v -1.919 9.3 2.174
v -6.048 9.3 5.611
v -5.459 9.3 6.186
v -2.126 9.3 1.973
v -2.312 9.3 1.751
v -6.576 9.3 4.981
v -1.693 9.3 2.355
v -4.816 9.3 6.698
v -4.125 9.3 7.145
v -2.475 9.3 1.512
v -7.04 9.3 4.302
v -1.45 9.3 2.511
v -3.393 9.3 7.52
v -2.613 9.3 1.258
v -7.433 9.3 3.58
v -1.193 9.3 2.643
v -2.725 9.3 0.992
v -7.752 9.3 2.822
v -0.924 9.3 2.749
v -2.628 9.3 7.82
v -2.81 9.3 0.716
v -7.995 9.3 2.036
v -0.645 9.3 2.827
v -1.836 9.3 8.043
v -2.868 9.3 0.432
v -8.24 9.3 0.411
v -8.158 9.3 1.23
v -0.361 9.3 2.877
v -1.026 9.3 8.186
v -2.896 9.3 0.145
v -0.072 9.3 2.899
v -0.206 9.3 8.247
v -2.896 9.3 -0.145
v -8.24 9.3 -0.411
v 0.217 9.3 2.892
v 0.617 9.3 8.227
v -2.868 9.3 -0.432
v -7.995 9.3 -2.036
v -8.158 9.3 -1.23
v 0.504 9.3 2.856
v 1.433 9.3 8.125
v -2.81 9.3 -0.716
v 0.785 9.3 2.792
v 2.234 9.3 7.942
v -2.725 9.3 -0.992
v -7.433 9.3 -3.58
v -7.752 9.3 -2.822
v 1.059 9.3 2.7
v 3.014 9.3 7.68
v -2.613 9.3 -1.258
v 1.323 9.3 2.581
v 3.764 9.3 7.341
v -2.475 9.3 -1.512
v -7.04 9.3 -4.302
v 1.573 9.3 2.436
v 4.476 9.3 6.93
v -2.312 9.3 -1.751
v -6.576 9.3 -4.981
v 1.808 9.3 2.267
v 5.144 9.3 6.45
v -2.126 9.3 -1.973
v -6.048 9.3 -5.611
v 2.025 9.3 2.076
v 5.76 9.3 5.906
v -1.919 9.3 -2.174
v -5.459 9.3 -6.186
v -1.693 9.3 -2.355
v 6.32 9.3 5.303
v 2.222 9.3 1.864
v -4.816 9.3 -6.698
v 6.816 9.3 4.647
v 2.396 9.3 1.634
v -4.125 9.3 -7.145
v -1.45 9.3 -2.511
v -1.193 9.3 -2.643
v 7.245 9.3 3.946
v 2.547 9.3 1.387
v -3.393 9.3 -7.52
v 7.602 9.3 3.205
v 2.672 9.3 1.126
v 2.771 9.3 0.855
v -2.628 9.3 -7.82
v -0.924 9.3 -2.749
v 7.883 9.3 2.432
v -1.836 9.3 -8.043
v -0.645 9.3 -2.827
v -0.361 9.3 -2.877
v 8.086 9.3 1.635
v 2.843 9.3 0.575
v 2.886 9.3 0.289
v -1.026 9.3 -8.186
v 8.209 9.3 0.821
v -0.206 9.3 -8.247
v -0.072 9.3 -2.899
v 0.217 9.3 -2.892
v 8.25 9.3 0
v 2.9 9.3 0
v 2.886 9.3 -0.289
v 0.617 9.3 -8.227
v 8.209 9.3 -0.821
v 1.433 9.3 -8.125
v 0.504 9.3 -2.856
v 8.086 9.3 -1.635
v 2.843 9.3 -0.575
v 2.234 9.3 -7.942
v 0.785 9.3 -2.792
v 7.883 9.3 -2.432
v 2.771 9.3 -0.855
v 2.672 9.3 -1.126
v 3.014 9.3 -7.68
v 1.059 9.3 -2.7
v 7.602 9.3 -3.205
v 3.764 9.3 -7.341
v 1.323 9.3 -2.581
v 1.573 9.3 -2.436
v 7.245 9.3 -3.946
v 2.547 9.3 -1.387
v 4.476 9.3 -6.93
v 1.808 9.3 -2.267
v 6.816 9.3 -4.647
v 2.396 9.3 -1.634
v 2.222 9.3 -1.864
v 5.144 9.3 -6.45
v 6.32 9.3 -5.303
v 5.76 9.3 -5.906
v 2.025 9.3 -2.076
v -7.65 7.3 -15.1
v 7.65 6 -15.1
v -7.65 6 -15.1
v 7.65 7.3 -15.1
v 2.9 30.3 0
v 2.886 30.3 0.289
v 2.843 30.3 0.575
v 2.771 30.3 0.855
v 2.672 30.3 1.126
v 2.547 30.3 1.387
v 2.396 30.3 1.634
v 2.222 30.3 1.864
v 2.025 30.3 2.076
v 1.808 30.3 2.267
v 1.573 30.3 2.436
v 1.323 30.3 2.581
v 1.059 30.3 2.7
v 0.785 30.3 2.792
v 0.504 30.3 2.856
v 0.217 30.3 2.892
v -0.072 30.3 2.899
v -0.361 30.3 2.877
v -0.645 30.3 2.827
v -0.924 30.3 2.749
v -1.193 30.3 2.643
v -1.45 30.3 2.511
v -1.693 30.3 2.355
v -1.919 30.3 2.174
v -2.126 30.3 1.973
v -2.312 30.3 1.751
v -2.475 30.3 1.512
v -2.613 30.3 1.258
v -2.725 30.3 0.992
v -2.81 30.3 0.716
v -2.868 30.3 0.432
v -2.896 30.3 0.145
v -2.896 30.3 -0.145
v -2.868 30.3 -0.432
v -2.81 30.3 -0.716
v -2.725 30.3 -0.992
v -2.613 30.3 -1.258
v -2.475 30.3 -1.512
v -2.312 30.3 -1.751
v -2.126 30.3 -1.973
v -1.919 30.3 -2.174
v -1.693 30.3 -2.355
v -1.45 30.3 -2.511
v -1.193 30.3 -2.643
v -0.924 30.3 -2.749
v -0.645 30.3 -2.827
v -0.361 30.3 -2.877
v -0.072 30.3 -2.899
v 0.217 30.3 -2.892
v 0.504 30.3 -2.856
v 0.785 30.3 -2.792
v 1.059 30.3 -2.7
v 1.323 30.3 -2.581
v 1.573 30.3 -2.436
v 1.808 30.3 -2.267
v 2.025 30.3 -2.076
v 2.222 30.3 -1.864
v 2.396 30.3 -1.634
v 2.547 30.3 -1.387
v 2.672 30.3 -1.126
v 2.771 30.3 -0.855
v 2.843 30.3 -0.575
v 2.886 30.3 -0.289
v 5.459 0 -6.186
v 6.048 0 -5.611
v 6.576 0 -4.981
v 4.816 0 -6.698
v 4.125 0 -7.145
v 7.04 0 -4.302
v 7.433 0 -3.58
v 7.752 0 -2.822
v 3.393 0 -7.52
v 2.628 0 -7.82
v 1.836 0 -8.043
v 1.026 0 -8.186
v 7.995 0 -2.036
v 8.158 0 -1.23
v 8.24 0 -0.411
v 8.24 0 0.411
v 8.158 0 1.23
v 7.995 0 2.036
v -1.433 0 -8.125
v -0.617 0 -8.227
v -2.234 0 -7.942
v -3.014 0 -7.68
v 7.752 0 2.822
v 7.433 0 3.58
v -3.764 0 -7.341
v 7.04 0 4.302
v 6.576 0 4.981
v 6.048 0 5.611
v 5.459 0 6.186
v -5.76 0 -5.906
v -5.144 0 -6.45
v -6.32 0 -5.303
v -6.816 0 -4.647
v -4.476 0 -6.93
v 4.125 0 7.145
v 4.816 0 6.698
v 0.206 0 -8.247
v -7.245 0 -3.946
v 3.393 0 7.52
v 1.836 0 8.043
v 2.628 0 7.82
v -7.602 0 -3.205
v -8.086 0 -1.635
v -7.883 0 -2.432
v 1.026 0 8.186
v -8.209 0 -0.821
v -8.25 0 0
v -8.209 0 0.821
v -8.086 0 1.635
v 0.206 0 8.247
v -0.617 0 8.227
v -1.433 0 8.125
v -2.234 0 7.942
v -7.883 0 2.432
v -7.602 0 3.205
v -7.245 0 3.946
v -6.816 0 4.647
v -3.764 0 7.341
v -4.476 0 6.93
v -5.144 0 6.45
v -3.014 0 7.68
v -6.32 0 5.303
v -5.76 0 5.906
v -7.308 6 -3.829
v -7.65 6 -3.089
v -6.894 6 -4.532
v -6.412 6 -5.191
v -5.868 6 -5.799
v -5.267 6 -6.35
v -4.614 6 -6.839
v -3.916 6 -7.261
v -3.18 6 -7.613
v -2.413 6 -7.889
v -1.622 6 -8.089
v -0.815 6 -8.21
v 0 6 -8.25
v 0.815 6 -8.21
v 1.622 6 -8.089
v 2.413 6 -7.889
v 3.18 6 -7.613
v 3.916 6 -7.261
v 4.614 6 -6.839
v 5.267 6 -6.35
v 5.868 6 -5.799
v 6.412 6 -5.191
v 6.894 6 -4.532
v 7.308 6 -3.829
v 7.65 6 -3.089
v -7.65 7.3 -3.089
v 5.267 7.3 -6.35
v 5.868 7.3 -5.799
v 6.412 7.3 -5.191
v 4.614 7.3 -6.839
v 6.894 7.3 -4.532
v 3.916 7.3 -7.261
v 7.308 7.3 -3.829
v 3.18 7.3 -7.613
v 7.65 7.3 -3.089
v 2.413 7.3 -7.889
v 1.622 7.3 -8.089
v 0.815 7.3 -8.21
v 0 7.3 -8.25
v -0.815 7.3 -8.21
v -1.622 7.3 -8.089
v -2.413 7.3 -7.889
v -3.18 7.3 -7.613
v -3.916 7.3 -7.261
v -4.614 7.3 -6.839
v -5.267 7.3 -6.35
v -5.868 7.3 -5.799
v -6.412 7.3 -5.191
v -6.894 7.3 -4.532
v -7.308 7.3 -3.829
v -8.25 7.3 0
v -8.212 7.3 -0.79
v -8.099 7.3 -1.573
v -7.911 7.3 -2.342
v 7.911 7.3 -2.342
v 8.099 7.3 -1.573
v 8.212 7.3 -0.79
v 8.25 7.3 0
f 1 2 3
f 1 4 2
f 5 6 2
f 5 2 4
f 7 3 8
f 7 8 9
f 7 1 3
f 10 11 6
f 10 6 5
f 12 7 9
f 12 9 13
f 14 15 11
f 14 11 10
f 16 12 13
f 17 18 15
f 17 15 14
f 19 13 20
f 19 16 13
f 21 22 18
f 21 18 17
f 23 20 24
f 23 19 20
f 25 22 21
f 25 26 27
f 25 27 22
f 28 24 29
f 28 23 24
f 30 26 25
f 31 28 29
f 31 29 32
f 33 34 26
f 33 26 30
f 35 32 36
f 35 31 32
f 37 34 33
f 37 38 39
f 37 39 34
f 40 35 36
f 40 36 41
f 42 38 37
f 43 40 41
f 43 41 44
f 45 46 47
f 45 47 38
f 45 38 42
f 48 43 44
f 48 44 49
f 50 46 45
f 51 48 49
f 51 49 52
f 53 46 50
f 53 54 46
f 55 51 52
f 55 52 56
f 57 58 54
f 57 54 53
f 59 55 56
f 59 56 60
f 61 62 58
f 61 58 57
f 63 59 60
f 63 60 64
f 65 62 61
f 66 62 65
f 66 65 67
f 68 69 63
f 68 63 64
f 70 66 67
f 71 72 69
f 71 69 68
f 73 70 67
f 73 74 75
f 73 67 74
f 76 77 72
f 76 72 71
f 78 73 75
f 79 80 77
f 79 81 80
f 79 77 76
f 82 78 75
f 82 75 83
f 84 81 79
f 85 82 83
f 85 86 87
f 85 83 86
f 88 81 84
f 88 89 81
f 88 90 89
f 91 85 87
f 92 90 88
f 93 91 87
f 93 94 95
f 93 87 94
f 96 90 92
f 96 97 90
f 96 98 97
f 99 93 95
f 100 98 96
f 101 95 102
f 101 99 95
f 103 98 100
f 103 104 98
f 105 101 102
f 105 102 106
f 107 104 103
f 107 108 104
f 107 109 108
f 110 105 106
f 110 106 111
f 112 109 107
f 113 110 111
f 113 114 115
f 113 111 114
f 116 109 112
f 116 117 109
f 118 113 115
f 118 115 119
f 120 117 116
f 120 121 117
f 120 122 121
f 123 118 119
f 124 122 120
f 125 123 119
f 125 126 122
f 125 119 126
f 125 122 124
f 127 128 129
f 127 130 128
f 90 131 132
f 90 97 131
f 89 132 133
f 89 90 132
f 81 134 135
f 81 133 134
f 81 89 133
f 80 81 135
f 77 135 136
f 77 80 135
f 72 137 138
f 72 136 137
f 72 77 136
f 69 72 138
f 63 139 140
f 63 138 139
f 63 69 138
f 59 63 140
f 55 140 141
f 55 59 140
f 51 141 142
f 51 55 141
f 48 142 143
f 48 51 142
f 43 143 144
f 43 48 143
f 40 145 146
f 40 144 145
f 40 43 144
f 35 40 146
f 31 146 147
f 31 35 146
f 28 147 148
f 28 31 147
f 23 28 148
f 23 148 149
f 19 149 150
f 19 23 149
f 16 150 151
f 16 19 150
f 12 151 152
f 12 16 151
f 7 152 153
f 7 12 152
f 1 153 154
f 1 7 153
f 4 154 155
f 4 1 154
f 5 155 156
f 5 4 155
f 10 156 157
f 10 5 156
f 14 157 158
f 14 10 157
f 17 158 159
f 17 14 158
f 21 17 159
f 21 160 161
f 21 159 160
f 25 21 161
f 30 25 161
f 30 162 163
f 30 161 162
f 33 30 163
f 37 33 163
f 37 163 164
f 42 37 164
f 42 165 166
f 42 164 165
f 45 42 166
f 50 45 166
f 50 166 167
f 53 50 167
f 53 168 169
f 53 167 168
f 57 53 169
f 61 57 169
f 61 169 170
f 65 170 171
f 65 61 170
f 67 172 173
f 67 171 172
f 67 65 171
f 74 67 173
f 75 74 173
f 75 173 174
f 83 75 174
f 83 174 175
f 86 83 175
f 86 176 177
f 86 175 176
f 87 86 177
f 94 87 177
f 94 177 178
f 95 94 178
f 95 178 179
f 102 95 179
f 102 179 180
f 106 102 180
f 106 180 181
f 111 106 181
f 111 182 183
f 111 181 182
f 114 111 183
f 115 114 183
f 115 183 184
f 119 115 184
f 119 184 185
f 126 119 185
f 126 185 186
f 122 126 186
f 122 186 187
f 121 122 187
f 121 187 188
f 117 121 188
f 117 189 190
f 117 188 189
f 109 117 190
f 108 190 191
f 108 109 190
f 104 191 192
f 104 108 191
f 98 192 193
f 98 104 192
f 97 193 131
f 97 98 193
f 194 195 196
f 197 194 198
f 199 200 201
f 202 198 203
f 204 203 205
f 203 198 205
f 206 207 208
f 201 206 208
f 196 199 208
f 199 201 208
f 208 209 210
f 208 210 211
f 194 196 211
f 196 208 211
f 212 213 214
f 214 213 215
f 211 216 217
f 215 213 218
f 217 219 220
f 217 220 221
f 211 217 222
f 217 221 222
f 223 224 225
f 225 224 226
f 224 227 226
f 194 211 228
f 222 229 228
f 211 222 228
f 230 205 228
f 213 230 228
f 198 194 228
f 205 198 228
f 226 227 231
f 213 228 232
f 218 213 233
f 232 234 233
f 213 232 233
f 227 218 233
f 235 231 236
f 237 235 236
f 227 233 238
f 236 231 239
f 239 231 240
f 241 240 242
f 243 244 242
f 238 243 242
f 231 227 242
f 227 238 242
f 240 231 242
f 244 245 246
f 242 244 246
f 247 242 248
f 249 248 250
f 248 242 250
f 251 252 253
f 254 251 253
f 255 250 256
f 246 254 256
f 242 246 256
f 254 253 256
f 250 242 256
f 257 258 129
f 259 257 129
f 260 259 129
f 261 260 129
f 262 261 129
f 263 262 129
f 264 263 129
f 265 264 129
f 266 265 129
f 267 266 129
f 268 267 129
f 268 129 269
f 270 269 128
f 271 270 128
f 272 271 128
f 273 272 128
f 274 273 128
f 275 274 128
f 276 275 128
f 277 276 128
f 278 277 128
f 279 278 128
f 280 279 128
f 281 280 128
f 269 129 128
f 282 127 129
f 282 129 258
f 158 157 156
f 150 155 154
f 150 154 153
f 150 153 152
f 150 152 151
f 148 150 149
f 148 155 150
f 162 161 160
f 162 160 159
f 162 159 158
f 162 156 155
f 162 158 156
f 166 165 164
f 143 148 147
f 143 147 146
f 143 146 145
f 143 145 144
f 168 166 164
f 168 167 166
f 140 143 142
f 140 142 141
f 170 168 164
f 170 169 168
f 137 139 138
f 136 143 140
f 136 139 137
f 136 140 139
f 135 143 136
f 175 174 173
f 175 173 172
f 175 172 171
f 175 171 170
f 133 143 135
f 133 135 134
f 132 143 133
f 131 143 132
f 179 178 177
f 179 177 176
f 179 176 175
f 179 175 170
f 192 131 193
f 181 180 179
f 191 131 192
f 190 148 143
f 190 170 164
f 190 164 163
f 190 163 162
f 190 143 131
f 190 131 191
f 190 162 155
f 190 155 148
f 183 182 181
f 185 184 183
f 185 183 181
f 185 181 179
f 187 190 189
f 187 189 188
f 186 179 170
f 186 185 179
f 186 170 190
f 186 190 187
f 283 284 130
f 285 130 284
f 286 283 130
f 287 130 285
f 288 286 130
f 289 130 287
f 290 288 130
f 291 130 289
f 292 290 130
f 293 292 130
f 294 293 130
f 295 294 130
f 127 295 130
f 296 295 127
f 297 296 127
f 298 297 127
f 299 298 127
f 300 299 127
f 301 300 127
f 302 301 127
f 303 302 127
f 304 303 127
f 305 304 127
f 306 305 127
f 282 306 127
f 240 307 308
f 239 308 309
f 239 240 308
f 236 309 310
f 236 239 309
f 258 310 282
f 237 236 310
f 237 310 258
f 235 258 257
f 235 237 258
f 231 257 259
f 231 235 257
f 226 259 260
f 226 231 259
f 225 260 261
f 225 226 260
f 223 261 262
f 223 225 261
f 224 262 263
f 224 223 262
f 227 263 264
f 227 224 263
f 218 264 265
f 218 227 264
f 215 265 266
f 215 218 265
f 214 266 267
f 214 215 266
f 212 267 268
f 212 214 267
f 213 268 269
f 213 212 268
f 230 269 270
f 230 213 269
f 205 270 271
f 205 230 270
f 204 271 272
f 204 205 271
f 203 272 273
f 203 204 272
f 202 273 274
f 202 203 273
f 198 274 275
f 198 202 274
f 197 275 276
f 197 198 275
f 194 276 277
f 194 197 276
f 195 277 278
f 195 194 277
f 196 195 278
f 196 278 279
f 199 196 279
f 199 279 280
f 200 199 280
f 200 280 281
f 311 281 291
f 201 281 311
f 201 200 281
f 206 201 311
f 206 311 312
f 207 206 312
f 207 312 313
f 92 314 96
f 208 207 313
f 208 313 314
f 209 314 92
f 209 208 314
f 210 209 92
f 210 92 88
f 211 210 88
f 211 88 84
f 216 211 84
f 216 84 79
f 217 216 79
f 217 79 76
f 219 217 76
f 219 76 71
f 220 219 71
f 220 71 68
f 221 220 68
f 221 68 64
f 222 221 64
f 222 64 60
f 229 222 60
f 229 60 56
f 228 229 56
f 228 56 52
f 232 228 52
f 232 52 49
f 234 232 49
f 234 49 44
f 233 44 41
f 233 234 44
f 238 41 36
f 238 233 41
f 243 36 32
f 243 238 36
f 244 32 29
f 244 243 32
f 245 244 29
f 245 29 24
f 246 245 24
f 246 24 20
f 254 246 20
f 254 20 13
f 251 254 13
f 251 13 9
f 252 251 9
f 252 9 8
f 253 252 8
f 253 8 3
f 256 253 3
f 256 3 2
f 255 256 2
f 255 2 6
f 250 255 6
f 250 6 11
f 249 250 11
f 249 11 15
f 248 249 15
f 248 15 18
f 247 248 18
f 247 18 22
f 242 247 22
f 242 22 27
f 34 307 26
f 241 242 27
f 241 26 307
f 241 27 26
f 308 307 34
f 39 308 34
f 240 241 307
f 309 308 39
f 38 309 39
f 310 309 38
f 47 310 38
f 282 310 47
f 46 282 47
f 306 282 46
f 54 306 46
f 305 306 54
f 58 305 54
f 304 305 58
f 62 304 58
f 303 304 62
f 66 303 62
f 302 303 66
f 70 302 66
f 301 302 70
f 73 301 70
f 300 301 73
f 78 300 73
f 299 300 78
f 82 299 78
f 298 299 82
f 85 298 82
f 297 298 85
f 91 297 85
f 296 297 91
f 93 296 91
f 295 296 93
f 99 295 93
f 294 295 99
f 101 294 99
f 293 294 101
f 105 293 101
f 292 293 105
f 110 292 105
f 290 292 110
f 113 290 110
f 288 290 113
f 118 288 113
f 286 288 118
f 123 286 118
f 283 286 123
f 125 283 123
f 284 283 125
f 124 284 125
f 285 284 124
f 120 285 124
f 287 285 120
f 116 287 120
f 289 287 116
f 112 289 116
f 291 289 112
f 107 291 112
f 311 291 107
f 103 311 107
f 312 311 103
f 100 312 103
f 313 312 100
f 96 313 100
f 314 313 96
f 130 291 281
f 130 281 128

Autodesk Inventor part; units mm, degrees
ref_plane "YZ Plane" through (0, 0, 0) normal (1, 0, 0) x (0, 1, 0)
ref_plane "XZ Plane" through (0, 0, 0) normal (0, 1, 0) x (-1, 0, 0)
ref_plane "XY Plane" through (0, 0, 0) normal (0, 0, 1) x (1, 0, 0)
sketch "Sketch1" plane through (0, 0, 0) normal (0, 1, 0) x (-1, 0, 0)
  circle A0 centre (0, 0) radius 8.25
  dimension "d0" = 16.5
extrude "Extrusion1" add sketch "Sketch1" along normal blind 7.3
sketch "Sketch3" plane through (0, 7.3, 0) normal (0, 1, 0) x (1, 0, 0)
  line L0 (-7.65, 3) -> (7.65, 3)
  line L1 (7.65, 3) -> (7.65, 15.1)
  line L2 (7.65, 15.1) -> (-7.65, 15.1)
  line L3 (-7.65, 15.1) -> (-7.65, 3)
  point P0 (0, 0)
  dimension "d3" = 15.3
  dimension "d4" = 3
  dimension "d5" = 7.65
  dimension "d6" = 12.1
extrude "Extrusion2" add sketch "Sketch3" against normal blind 1.3
sketch "Sketch4" plane through (0, 7.3, 0) normal (0, 1, 0) x (1, 0, 0)
  circle A0 centre (0, 0) radius 8.25
  dimension "d9" = 16.5
extrude "Extrusion3" add sketch "Sketch4" along normal blind 2
sketch "Sketch5" plane through (0, 9.3, 0) normal (0, 1, 0) x (1, 0, 0)
  circle A0 centre (0, 0) radius 2.9
  dimension "d12" = 5.8
extrude "Extrusion4" add sketch "Sketch5" along normal blind 21
properties part number "Potentiometer_Model"
